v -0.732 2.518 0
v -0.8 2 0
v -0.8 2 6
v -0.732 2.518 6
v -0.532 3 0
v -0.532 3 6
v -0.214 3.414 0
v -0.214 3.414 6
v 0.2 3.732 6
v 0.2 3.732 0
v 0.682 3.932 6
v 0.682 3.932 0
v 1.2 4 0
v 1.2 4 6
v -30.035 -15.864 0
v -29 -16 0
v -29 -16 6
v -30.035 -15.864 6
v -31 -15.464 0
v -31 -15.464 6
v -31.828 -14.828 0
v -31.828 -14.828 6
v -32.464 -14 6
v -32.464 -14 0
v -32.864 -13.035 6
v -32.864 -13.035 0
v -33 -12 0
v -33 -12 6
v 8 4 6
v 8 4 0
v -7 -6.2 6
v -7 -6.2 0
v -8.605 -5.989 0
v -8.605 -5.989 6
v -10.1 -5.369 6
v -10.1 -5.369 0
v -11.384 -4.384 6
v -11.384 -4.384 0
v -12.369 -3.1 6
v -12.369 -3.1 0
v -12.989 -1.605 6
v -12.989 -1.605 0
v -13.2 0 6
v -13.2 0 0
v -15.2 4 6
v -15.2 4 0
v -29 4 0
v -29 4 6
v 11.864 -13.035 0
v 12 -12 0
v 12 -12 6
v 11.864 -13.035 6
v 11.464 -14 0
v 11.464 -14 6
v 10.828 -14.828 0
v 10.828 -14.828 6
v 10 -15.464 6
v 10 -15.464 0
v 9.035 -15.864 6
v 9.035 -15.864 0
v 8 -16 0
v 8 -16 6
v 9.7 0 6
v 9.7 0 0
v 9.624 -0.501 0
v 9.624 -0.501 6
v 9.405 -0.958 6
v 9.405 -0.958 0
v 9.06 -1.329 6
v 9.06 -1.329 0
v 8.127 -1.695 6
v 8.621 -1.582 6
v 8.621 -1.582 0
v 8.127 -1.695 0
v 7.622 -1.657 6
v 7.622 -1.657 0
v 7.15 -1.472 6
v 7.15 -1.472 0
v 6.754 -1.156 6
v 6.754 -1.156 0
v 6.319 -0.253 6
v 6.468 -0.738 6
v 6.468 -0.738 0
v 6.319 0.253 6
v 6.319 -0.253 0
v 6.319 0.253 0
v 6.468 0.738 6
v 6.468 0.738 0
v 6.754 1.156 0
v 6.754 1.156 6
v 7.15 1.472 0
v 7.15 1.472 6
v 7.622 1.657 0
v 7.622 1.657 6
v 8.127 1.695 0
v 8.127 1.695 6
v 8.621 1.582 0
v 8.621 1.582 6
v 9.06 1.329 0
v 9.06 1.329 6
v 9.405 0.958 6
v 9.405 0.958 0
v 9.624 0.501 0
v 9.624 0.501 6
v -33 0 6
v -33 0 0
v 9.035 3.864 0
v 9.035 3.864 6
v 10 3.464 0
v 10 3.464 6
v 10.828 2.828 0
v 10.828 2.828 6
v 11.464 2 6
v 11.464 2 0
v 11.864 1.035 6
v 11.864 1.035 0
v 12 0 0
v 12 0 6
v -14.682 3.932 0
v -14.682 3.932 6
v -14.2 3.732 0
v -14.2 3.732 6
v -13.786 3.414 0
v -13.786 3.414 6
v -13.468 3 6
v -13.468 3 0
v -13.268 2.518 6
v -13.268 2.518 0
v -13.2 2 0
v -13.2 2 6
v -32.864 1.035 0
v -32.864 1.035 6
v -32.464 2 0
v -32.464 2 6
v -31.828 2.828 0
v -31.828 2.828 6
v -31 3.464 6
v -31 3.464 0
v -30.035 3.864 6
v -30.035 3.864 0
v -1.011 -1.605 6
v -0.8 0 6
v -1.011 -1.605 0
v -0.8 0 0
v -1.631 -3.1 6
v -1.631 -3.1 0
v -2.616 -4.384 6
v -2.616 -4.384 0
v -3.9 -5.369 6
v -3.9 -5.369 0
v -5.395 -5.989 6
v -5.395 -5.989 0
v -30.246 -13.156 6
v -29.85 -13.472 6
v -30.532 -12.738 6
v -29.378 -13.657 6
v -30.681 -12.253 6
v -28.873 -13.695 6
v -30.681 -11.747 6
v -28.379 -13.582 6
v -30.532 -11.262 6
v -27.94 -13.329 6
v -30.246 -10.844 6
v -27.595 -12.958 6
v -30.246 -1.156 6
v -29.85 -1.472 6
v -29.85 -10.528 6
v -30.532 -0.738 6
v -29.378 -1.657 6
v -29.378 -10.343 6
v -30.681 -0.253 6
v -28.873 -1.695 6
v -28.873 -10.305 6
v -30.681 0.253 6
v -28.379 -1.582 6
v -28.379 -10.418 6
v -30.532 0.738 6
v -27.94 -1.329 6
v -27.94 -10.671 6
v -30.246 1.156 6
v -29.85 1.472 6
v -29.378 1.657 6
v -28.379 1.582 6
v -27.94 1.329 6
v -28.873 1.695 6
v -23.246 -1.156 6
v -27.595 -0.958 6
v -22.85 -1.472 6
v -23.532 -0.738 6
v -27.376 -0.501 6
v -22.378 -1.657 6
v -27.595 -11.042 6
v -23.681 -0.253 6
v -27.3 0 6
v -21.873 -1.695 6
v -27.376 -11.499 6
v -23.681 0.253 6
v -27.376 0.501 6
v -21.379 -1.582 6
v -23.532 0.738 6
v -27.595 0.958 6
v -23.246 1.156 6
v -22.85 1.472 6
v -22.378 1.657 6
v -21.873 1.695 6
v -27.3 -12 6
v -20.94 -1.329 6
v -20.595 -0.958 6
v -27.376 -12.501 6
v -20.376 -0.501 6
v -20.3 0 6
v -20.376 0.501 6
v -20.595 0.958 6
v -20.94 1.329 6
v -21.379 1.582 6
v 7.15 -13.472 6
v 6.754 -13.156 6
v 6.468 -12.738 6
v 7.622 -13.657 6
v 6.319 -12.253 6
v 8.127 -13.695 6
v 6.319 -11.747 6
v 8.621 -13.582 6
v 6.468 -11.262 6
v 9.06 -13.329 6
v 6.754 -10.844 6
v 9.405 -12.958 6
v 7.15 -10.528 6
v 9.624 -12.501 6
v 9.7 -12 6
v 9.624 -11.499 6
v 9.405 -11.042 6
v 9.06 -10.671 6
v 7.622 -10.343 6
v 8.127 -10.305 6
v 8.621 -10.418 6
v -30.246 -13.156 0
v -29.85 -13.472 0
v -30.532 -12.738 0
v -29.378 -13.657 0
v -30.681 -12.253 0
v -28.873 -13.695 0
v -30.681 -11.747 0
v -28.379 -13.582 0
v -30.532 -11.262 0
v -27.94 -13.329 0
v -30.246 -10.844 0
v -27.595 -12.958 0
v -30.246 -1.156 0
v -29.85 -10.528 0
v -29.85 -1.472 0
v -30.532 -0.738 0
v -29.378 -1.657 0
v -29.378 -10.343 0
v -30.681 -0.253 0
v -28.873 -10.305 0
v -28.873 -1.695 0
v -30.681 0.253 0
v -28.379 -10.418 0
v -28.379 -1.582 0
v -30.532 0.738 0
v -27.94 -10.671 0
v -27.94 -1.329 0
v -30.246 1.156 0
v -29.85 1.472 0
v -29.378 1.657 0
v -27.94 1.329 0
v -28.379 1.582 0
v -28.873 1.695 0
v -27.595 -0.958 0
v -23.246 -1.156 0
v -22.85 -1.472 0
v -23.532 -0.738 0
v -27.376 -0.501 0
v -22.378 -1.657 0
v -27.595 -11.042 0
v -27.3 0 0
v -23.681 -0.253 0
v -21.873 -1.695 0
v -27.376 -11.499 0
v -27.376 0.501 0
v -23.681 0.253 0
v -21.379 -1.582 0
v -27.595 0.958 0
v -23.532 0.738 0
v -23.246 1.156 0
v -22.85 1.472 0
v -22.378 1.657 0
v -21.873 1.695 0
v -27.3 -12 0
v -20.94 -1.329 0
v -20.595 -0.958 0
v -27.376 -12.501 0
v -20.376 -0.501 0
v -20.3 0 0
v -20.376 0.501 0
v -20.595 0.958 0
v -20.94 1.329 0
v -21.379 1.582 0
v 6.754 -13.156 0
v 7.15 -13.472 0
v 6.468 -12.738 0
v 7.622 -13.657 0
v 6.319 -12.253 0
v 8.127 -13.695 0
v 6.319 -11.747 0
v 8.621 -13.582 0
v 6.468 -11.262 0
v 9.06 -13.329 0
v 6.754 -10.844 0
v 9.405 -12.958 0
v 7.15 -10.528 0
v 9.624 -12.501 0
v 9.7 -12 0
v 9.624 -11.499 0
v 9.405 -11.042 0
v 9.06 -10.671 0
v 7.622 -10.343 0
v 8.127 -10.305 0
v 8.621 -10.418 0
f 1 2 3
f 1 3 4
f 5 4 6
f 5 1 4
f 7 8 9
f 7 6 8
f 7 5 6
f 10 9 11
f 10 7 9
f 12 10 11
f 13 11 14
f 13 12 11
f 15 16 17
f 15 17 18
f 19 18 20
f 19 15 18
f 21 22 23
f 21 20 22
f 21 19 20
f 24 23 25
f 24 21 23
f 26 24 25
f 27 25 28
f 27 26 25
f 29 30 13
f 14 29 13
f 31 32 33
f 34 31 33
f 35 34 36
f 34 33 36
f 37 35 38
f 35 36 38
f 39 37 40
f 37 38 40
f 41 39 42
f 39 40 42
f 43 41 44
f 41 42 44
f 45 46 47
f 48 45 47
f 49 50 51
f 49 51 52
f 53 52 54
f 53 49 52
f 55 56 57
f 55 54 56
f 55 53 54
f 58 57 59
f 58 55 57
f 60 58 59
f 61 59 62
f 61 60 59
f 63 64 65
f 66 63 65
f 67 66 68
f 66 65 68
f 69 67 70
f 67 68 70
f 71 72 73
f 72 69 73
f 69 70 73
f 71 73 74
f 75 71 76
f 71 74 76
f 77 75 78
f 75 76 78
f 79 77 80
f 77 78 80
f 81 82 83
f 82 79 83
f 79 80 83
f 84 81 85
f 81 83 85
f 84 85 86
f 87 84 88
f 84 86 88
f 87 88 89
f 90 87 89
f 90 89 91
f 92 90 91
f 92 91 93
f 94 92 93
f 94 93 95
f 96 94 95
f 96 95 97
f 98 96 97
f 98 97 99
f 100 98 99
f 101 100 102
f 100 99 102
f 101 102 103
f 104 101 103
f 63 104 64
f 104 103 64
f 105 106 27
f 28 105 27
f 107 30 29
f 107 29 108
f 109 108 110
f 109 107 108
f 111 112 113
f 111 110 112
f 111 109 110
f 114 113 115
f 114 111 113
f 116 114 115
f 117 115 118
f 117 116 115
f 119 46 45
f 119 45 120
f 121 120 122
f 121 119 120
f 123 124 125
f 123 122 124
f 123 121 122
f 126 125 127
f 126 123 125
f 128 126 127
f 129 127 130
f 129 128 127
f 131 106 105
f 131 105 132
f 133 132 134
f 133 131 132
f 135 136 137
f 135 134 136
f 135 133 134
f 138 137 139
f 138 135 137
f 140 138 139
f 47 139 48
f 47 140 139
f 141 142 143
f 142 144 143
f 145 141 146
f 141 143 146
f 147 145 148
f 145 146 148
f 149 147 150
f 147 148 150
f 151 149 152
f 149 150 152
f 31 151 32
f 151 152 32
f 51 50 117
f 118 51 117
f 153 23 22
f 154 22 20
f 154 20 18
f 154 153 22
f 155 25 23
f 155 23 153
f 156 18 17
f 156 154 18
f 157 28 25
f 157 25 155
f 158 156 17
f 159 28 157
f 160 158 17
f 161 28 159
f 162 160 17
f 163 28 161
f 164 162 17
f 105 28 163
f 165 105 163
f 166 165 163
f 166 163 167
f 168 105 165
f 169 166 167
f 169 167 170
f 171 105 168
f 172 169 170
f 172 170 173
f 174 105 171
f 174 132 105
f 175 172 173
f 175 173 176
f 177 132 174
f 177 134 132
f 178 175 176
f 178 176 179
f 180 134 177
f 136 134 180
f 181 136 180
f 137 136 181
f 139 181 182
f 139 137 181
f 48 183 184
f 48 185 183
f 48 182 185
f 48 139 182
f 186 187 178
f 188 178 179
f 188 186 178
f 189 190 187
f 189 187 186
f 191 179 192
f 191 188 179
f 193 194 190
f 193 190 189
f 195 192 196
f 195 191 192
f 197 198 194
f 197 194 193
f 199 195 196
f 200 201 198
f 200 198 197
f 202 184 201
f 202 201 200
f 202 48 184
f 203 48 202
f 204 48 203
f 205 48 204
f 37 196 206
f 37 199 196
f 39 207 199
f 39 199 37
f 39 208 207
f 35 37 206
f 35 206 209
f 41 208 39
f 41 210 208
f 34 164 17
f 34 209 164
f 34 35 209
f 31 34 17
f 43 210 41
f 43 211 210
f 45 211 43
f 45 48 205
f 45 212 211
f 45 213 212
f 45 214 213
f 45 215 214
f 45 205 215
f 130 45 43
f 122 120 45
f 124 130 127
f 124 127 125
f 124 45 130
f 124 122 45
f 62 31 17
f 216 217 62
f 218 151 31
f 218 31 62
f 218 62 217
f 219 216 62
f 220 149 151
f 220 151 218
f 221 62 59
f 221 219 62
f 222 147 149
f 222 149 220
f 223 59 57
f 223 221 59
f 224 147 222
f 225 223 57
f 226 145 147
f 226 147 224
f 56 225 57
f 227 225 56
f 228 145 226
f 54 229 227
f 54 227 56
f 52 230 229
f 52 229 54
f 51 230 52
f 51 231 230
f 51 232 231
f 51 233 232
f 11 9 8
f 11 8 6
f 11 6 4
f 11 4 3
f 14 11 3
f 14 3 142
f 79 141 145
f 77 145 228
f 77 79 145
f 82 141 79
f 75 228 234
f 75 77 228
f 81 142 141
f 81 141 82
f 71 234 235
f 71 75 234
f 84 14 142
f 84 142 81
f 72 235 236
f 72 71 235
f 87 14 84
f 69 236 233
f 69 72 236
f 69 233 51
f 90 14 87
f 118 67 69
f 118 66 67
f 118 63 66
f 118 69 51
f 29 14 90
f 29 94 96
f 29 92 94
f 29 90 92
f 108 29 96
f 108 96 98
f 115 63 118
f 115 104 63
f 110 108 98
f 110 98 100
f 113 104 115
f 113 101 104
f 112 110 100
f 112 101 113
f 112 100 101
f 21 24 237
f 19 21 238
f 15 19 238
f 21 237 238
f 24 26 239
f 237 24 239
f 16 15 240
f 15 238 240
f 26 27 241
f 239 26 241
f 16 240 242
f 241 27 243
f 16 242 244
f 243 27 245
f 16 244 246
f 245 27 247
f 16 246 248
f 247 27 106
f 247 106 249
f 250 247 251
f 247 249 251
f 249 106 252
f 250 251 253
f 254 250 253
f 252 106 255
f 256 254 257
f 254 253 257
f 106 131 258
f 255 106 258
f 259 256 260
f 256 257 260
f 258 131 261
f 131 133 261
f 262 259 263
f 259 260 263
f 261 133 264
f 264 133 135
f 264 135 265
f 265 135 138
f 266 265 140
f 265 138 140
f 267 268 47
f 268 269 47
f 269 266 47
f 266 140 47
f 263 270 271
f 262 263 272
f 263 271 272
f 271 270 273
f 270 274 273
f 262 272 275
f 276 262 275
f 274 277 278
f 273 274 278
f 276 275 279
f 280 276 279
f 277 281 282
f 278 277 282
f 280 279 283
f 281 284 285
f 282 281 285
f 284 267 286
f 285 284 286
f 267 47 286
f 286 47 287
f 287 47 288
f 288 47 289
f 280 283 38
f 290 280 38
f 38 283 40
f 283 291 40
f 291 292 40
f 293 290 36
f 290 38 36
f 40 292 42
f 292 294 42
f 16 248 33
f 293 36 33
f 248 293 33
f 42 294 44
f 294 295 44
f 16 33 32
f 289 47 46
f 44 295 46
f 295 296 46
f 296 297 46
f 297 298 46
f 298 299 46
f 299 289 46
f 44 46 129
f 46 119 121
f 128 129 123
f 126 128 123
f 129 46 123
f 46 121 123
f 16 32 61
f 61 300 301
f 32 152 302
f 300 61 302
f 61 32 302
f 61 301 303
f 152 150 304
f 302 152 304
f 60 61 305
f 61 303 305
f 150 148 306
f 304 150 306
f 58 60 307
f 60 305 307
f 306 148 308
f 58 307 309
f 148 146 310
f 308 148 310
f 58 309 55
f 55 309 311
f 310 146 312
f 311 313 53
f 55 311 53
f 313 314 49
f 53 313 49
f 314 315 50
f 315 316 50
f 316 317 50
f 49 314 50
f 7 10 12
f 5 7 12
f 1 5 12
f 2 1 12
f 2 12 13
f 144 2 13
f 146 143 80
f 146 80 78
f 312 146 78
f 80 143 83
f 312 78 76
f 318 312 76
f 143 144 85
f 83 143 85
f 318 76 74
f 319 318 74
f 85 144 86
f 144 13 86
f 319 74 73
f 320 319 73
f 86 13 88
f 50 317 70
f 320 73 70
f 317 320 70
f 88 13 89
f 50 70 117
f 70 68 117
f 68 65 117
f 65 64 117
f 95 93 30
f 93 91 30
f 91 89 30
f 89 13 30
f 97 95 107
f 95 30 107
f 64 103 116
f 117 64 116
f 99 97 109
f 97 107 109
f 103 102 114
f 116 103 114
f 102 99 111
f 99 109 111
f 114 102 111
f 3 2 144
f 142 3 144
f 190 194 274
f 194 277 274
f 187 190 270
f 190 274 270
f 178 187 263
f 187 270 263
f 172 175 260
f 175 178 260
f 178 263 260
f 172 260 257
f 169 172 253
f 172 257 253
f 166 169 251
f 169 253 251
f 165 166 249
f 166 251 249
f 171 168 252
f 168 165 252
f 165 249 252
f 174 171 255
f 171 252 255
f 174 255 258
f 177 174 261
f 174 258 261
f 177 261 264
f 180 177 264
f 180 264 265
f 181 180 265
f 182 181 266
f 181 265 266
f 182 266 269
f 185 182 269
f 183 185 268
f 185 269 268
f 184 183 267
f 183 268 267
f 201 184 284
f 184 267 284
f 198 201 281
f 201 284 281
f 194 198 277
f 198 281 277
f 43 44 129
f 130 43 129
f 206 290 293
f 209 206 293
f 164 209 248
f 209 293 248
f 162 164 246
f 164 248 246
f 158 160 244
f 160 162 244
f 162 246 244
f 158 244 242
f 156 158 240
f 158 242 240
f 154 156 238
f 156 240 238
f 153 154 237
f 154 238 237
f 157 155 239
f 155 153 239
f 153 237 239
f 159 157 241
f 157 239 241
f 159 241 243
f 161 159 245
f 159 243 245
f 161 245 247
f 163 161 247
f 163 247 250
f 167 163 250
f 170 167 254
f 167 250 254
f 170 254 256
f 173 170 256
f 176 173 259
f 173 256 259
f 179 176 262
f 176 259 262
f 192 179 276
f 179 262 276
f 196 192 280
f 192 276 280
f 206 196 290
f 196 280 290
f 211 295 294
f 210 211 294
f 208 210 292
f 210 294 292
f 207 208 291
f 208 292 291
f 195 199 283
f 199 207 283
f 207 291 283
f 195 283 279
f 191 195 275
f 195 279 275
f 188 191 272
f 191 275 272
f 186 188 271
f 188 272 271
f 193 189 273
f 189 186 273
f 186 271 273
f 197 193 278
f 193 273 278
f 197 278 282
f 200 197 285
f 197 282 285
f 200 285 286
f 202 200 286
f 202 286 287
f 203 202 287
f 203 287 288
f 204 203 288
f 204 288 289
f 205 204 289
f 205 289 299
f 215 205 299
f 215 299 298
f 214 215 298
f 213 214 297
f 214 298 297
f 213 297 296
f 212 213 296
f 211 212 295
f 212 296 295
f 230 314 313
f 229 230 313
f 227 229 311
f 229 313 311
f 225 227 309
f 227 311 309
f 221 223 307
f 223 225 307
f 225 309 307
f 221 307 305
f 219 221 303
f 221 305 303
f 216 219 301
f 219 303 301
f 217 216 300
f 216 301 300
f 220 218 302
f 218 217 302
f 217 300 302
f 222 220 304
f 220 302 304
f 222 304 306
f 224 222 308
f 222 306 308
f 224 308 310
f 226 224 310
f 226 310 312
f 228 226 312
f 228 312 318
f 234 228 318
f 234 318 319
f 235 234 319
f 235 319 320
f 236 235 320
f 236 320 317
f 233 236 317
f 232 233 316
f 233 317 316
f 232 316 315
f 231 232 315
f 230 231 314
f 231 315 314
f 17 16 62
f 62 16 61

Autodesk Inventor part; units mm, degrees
ref_plane "YZ Plane" through (0, 0, 0) normal (1, 0, 0) x (0, 1, 0)
ref_plane "XZ Plane" through (0, 0, 0) normal (0, 1, 0) x (-1, 0, 0)
ref_plane "XY Plane" through (0, 0, 0) normal (0, 0, 1) x (1, 0, 0)
sketch "Sketch1" plane through (0, 0, 0) normal (0, 0, 1) x (1, 0, 0)
  line L0 (8, 8.75) -> (8, 11) construction
  line L1 (8, 11) -> (5.7378, 11) construction
  line L2 (5.7378, 11) -> (5.7378, 8) construction
  line L3 (5.7378, 8) -> (3.2622, 8) construction
  line L4 (3.2622, 8) -> (3.2622, 11) construction
  line L5 (3.2622, 11) -> (-17.2622, 11) construction
  line L6 (-17.2622, 11) -> (-17.2622, 8) construction
  line L7 (-17.2622, 8) -> (-19.7378, 8) construction
  line L8 (-19.7378, 8) -> (-19.7378, 11) construction
  line L9 (-19.7378, 11) -> (-22.75, 11) construction
  line L10 (-25.75, 14) -> (-22.75, 11) construction
  line L11 (-25.75, 14) -> (-25.75, 0) construction
  arc A0 (-25.75, 0) -> (-22, -3.75) centre (-22, 0) ccw construction
  line L12 (-22, -3.75) -> (-20.3954, -3.75) construction
  arc A1 (-16.2094, -6.0156) -> (-20.3954, -3.75) centre (-20.3954, -8.75) ccw construction
  arc A2 (-16.2094, -6.0156) -> (2.2094, -6.0156) centre (-7, 0) ccw construction
  arc A3 (6.3954, -3.75) -> (2.2094, -6.0156) centre (6.3954, -8.75) ccw construction
  line L13 (6.3954, -3.75) -> (8, -3.75) construction
  arc A4 (8, -3.75) -> (11.75, 0) centre (8, 0) ccw construction
  line L14 (11.75, 0) -> (11.75, 7) construction
  line L15 (11.75, 7) -> (9.75, 7) construction
  line L16 (9.75, 7) -> (8, 8.75) construction
  circle A5 centre (-7, 0) radius 8.2 construction
  circle A6 centre (8, 0) radius 1.75 construction
  circle A7 centre (-22, 0) radius 1.75 construction
  circle A8 centre (-22, 0) radius 1.7
  circle A9 centre (8, 0) radius 1.7
  line L17 (-33, 0) -> (-33, -12)
  line L18 (-29, -16) -> (8, -16)
  line L19 (12, -12) -> (12, 0)
  line L20 (15, 5) -> (-29, 5) construction
  circle A10 centre (-29, 0) radius 1.7
  circle A11 centre (-29, -12) radius 1.7
  circle A12 centre (8, -12) radius 1.7
  arc A13 (-29, 4) -> (-33, 0) centre (-29, 0) ccw
  arc A14 (12, 0) -> (8, 4) centre (8, 0) ccw
  arc A15 (8, -16) -> (12, -12) centre (8, -12) ccw
  arc A16 (-33, -12) -> (-29, -16) centre (-29, -12) ccw
  line L21 (-13.2, 0) -> (-13.2, 2)
  line L22 (-0.8, 2) -> (-0.8, 0)
  line L23 (8, 4) -> (1.2, 4)
  line L24 (-15.2, 4) -> (-29, 4)
  arc A17 (-13.2, 0) -> (-0.8, 0) centre (-7, 0) ccw
  arc A18 (1.2, 4) -> (-0.8, 2) centre (1.2, 2) ccw
  arc A19 (-13.2, 2) -> (-15.2, 4) centre (-15.2, 2) ccw
  line L25 (-7, 0) -> (-7, -14.8436)
  circle A20 centre (-29, 0) radius 3 construction
  point P0 (0, 0)
  point P1 (-7, -3)
  dimension "d1" = 3.4
  dimension "d2" = 3.4
  dimension "d7" = 3.4
  dimension "d8" = 3.4
  dimension "d10" = 3.4
  dimension "d11" = 4
  dimension "d13" = 2
  dimension "d16" = 6.2
  dimension "d20" = 37
  dimension "d21" = 12
  dimension "d23" = 4
  dimension "d24" = 6
extrude "Extrusion1" add sketch "Sketch1" along normal blind 6
properties part number "Extruder_clamp"
